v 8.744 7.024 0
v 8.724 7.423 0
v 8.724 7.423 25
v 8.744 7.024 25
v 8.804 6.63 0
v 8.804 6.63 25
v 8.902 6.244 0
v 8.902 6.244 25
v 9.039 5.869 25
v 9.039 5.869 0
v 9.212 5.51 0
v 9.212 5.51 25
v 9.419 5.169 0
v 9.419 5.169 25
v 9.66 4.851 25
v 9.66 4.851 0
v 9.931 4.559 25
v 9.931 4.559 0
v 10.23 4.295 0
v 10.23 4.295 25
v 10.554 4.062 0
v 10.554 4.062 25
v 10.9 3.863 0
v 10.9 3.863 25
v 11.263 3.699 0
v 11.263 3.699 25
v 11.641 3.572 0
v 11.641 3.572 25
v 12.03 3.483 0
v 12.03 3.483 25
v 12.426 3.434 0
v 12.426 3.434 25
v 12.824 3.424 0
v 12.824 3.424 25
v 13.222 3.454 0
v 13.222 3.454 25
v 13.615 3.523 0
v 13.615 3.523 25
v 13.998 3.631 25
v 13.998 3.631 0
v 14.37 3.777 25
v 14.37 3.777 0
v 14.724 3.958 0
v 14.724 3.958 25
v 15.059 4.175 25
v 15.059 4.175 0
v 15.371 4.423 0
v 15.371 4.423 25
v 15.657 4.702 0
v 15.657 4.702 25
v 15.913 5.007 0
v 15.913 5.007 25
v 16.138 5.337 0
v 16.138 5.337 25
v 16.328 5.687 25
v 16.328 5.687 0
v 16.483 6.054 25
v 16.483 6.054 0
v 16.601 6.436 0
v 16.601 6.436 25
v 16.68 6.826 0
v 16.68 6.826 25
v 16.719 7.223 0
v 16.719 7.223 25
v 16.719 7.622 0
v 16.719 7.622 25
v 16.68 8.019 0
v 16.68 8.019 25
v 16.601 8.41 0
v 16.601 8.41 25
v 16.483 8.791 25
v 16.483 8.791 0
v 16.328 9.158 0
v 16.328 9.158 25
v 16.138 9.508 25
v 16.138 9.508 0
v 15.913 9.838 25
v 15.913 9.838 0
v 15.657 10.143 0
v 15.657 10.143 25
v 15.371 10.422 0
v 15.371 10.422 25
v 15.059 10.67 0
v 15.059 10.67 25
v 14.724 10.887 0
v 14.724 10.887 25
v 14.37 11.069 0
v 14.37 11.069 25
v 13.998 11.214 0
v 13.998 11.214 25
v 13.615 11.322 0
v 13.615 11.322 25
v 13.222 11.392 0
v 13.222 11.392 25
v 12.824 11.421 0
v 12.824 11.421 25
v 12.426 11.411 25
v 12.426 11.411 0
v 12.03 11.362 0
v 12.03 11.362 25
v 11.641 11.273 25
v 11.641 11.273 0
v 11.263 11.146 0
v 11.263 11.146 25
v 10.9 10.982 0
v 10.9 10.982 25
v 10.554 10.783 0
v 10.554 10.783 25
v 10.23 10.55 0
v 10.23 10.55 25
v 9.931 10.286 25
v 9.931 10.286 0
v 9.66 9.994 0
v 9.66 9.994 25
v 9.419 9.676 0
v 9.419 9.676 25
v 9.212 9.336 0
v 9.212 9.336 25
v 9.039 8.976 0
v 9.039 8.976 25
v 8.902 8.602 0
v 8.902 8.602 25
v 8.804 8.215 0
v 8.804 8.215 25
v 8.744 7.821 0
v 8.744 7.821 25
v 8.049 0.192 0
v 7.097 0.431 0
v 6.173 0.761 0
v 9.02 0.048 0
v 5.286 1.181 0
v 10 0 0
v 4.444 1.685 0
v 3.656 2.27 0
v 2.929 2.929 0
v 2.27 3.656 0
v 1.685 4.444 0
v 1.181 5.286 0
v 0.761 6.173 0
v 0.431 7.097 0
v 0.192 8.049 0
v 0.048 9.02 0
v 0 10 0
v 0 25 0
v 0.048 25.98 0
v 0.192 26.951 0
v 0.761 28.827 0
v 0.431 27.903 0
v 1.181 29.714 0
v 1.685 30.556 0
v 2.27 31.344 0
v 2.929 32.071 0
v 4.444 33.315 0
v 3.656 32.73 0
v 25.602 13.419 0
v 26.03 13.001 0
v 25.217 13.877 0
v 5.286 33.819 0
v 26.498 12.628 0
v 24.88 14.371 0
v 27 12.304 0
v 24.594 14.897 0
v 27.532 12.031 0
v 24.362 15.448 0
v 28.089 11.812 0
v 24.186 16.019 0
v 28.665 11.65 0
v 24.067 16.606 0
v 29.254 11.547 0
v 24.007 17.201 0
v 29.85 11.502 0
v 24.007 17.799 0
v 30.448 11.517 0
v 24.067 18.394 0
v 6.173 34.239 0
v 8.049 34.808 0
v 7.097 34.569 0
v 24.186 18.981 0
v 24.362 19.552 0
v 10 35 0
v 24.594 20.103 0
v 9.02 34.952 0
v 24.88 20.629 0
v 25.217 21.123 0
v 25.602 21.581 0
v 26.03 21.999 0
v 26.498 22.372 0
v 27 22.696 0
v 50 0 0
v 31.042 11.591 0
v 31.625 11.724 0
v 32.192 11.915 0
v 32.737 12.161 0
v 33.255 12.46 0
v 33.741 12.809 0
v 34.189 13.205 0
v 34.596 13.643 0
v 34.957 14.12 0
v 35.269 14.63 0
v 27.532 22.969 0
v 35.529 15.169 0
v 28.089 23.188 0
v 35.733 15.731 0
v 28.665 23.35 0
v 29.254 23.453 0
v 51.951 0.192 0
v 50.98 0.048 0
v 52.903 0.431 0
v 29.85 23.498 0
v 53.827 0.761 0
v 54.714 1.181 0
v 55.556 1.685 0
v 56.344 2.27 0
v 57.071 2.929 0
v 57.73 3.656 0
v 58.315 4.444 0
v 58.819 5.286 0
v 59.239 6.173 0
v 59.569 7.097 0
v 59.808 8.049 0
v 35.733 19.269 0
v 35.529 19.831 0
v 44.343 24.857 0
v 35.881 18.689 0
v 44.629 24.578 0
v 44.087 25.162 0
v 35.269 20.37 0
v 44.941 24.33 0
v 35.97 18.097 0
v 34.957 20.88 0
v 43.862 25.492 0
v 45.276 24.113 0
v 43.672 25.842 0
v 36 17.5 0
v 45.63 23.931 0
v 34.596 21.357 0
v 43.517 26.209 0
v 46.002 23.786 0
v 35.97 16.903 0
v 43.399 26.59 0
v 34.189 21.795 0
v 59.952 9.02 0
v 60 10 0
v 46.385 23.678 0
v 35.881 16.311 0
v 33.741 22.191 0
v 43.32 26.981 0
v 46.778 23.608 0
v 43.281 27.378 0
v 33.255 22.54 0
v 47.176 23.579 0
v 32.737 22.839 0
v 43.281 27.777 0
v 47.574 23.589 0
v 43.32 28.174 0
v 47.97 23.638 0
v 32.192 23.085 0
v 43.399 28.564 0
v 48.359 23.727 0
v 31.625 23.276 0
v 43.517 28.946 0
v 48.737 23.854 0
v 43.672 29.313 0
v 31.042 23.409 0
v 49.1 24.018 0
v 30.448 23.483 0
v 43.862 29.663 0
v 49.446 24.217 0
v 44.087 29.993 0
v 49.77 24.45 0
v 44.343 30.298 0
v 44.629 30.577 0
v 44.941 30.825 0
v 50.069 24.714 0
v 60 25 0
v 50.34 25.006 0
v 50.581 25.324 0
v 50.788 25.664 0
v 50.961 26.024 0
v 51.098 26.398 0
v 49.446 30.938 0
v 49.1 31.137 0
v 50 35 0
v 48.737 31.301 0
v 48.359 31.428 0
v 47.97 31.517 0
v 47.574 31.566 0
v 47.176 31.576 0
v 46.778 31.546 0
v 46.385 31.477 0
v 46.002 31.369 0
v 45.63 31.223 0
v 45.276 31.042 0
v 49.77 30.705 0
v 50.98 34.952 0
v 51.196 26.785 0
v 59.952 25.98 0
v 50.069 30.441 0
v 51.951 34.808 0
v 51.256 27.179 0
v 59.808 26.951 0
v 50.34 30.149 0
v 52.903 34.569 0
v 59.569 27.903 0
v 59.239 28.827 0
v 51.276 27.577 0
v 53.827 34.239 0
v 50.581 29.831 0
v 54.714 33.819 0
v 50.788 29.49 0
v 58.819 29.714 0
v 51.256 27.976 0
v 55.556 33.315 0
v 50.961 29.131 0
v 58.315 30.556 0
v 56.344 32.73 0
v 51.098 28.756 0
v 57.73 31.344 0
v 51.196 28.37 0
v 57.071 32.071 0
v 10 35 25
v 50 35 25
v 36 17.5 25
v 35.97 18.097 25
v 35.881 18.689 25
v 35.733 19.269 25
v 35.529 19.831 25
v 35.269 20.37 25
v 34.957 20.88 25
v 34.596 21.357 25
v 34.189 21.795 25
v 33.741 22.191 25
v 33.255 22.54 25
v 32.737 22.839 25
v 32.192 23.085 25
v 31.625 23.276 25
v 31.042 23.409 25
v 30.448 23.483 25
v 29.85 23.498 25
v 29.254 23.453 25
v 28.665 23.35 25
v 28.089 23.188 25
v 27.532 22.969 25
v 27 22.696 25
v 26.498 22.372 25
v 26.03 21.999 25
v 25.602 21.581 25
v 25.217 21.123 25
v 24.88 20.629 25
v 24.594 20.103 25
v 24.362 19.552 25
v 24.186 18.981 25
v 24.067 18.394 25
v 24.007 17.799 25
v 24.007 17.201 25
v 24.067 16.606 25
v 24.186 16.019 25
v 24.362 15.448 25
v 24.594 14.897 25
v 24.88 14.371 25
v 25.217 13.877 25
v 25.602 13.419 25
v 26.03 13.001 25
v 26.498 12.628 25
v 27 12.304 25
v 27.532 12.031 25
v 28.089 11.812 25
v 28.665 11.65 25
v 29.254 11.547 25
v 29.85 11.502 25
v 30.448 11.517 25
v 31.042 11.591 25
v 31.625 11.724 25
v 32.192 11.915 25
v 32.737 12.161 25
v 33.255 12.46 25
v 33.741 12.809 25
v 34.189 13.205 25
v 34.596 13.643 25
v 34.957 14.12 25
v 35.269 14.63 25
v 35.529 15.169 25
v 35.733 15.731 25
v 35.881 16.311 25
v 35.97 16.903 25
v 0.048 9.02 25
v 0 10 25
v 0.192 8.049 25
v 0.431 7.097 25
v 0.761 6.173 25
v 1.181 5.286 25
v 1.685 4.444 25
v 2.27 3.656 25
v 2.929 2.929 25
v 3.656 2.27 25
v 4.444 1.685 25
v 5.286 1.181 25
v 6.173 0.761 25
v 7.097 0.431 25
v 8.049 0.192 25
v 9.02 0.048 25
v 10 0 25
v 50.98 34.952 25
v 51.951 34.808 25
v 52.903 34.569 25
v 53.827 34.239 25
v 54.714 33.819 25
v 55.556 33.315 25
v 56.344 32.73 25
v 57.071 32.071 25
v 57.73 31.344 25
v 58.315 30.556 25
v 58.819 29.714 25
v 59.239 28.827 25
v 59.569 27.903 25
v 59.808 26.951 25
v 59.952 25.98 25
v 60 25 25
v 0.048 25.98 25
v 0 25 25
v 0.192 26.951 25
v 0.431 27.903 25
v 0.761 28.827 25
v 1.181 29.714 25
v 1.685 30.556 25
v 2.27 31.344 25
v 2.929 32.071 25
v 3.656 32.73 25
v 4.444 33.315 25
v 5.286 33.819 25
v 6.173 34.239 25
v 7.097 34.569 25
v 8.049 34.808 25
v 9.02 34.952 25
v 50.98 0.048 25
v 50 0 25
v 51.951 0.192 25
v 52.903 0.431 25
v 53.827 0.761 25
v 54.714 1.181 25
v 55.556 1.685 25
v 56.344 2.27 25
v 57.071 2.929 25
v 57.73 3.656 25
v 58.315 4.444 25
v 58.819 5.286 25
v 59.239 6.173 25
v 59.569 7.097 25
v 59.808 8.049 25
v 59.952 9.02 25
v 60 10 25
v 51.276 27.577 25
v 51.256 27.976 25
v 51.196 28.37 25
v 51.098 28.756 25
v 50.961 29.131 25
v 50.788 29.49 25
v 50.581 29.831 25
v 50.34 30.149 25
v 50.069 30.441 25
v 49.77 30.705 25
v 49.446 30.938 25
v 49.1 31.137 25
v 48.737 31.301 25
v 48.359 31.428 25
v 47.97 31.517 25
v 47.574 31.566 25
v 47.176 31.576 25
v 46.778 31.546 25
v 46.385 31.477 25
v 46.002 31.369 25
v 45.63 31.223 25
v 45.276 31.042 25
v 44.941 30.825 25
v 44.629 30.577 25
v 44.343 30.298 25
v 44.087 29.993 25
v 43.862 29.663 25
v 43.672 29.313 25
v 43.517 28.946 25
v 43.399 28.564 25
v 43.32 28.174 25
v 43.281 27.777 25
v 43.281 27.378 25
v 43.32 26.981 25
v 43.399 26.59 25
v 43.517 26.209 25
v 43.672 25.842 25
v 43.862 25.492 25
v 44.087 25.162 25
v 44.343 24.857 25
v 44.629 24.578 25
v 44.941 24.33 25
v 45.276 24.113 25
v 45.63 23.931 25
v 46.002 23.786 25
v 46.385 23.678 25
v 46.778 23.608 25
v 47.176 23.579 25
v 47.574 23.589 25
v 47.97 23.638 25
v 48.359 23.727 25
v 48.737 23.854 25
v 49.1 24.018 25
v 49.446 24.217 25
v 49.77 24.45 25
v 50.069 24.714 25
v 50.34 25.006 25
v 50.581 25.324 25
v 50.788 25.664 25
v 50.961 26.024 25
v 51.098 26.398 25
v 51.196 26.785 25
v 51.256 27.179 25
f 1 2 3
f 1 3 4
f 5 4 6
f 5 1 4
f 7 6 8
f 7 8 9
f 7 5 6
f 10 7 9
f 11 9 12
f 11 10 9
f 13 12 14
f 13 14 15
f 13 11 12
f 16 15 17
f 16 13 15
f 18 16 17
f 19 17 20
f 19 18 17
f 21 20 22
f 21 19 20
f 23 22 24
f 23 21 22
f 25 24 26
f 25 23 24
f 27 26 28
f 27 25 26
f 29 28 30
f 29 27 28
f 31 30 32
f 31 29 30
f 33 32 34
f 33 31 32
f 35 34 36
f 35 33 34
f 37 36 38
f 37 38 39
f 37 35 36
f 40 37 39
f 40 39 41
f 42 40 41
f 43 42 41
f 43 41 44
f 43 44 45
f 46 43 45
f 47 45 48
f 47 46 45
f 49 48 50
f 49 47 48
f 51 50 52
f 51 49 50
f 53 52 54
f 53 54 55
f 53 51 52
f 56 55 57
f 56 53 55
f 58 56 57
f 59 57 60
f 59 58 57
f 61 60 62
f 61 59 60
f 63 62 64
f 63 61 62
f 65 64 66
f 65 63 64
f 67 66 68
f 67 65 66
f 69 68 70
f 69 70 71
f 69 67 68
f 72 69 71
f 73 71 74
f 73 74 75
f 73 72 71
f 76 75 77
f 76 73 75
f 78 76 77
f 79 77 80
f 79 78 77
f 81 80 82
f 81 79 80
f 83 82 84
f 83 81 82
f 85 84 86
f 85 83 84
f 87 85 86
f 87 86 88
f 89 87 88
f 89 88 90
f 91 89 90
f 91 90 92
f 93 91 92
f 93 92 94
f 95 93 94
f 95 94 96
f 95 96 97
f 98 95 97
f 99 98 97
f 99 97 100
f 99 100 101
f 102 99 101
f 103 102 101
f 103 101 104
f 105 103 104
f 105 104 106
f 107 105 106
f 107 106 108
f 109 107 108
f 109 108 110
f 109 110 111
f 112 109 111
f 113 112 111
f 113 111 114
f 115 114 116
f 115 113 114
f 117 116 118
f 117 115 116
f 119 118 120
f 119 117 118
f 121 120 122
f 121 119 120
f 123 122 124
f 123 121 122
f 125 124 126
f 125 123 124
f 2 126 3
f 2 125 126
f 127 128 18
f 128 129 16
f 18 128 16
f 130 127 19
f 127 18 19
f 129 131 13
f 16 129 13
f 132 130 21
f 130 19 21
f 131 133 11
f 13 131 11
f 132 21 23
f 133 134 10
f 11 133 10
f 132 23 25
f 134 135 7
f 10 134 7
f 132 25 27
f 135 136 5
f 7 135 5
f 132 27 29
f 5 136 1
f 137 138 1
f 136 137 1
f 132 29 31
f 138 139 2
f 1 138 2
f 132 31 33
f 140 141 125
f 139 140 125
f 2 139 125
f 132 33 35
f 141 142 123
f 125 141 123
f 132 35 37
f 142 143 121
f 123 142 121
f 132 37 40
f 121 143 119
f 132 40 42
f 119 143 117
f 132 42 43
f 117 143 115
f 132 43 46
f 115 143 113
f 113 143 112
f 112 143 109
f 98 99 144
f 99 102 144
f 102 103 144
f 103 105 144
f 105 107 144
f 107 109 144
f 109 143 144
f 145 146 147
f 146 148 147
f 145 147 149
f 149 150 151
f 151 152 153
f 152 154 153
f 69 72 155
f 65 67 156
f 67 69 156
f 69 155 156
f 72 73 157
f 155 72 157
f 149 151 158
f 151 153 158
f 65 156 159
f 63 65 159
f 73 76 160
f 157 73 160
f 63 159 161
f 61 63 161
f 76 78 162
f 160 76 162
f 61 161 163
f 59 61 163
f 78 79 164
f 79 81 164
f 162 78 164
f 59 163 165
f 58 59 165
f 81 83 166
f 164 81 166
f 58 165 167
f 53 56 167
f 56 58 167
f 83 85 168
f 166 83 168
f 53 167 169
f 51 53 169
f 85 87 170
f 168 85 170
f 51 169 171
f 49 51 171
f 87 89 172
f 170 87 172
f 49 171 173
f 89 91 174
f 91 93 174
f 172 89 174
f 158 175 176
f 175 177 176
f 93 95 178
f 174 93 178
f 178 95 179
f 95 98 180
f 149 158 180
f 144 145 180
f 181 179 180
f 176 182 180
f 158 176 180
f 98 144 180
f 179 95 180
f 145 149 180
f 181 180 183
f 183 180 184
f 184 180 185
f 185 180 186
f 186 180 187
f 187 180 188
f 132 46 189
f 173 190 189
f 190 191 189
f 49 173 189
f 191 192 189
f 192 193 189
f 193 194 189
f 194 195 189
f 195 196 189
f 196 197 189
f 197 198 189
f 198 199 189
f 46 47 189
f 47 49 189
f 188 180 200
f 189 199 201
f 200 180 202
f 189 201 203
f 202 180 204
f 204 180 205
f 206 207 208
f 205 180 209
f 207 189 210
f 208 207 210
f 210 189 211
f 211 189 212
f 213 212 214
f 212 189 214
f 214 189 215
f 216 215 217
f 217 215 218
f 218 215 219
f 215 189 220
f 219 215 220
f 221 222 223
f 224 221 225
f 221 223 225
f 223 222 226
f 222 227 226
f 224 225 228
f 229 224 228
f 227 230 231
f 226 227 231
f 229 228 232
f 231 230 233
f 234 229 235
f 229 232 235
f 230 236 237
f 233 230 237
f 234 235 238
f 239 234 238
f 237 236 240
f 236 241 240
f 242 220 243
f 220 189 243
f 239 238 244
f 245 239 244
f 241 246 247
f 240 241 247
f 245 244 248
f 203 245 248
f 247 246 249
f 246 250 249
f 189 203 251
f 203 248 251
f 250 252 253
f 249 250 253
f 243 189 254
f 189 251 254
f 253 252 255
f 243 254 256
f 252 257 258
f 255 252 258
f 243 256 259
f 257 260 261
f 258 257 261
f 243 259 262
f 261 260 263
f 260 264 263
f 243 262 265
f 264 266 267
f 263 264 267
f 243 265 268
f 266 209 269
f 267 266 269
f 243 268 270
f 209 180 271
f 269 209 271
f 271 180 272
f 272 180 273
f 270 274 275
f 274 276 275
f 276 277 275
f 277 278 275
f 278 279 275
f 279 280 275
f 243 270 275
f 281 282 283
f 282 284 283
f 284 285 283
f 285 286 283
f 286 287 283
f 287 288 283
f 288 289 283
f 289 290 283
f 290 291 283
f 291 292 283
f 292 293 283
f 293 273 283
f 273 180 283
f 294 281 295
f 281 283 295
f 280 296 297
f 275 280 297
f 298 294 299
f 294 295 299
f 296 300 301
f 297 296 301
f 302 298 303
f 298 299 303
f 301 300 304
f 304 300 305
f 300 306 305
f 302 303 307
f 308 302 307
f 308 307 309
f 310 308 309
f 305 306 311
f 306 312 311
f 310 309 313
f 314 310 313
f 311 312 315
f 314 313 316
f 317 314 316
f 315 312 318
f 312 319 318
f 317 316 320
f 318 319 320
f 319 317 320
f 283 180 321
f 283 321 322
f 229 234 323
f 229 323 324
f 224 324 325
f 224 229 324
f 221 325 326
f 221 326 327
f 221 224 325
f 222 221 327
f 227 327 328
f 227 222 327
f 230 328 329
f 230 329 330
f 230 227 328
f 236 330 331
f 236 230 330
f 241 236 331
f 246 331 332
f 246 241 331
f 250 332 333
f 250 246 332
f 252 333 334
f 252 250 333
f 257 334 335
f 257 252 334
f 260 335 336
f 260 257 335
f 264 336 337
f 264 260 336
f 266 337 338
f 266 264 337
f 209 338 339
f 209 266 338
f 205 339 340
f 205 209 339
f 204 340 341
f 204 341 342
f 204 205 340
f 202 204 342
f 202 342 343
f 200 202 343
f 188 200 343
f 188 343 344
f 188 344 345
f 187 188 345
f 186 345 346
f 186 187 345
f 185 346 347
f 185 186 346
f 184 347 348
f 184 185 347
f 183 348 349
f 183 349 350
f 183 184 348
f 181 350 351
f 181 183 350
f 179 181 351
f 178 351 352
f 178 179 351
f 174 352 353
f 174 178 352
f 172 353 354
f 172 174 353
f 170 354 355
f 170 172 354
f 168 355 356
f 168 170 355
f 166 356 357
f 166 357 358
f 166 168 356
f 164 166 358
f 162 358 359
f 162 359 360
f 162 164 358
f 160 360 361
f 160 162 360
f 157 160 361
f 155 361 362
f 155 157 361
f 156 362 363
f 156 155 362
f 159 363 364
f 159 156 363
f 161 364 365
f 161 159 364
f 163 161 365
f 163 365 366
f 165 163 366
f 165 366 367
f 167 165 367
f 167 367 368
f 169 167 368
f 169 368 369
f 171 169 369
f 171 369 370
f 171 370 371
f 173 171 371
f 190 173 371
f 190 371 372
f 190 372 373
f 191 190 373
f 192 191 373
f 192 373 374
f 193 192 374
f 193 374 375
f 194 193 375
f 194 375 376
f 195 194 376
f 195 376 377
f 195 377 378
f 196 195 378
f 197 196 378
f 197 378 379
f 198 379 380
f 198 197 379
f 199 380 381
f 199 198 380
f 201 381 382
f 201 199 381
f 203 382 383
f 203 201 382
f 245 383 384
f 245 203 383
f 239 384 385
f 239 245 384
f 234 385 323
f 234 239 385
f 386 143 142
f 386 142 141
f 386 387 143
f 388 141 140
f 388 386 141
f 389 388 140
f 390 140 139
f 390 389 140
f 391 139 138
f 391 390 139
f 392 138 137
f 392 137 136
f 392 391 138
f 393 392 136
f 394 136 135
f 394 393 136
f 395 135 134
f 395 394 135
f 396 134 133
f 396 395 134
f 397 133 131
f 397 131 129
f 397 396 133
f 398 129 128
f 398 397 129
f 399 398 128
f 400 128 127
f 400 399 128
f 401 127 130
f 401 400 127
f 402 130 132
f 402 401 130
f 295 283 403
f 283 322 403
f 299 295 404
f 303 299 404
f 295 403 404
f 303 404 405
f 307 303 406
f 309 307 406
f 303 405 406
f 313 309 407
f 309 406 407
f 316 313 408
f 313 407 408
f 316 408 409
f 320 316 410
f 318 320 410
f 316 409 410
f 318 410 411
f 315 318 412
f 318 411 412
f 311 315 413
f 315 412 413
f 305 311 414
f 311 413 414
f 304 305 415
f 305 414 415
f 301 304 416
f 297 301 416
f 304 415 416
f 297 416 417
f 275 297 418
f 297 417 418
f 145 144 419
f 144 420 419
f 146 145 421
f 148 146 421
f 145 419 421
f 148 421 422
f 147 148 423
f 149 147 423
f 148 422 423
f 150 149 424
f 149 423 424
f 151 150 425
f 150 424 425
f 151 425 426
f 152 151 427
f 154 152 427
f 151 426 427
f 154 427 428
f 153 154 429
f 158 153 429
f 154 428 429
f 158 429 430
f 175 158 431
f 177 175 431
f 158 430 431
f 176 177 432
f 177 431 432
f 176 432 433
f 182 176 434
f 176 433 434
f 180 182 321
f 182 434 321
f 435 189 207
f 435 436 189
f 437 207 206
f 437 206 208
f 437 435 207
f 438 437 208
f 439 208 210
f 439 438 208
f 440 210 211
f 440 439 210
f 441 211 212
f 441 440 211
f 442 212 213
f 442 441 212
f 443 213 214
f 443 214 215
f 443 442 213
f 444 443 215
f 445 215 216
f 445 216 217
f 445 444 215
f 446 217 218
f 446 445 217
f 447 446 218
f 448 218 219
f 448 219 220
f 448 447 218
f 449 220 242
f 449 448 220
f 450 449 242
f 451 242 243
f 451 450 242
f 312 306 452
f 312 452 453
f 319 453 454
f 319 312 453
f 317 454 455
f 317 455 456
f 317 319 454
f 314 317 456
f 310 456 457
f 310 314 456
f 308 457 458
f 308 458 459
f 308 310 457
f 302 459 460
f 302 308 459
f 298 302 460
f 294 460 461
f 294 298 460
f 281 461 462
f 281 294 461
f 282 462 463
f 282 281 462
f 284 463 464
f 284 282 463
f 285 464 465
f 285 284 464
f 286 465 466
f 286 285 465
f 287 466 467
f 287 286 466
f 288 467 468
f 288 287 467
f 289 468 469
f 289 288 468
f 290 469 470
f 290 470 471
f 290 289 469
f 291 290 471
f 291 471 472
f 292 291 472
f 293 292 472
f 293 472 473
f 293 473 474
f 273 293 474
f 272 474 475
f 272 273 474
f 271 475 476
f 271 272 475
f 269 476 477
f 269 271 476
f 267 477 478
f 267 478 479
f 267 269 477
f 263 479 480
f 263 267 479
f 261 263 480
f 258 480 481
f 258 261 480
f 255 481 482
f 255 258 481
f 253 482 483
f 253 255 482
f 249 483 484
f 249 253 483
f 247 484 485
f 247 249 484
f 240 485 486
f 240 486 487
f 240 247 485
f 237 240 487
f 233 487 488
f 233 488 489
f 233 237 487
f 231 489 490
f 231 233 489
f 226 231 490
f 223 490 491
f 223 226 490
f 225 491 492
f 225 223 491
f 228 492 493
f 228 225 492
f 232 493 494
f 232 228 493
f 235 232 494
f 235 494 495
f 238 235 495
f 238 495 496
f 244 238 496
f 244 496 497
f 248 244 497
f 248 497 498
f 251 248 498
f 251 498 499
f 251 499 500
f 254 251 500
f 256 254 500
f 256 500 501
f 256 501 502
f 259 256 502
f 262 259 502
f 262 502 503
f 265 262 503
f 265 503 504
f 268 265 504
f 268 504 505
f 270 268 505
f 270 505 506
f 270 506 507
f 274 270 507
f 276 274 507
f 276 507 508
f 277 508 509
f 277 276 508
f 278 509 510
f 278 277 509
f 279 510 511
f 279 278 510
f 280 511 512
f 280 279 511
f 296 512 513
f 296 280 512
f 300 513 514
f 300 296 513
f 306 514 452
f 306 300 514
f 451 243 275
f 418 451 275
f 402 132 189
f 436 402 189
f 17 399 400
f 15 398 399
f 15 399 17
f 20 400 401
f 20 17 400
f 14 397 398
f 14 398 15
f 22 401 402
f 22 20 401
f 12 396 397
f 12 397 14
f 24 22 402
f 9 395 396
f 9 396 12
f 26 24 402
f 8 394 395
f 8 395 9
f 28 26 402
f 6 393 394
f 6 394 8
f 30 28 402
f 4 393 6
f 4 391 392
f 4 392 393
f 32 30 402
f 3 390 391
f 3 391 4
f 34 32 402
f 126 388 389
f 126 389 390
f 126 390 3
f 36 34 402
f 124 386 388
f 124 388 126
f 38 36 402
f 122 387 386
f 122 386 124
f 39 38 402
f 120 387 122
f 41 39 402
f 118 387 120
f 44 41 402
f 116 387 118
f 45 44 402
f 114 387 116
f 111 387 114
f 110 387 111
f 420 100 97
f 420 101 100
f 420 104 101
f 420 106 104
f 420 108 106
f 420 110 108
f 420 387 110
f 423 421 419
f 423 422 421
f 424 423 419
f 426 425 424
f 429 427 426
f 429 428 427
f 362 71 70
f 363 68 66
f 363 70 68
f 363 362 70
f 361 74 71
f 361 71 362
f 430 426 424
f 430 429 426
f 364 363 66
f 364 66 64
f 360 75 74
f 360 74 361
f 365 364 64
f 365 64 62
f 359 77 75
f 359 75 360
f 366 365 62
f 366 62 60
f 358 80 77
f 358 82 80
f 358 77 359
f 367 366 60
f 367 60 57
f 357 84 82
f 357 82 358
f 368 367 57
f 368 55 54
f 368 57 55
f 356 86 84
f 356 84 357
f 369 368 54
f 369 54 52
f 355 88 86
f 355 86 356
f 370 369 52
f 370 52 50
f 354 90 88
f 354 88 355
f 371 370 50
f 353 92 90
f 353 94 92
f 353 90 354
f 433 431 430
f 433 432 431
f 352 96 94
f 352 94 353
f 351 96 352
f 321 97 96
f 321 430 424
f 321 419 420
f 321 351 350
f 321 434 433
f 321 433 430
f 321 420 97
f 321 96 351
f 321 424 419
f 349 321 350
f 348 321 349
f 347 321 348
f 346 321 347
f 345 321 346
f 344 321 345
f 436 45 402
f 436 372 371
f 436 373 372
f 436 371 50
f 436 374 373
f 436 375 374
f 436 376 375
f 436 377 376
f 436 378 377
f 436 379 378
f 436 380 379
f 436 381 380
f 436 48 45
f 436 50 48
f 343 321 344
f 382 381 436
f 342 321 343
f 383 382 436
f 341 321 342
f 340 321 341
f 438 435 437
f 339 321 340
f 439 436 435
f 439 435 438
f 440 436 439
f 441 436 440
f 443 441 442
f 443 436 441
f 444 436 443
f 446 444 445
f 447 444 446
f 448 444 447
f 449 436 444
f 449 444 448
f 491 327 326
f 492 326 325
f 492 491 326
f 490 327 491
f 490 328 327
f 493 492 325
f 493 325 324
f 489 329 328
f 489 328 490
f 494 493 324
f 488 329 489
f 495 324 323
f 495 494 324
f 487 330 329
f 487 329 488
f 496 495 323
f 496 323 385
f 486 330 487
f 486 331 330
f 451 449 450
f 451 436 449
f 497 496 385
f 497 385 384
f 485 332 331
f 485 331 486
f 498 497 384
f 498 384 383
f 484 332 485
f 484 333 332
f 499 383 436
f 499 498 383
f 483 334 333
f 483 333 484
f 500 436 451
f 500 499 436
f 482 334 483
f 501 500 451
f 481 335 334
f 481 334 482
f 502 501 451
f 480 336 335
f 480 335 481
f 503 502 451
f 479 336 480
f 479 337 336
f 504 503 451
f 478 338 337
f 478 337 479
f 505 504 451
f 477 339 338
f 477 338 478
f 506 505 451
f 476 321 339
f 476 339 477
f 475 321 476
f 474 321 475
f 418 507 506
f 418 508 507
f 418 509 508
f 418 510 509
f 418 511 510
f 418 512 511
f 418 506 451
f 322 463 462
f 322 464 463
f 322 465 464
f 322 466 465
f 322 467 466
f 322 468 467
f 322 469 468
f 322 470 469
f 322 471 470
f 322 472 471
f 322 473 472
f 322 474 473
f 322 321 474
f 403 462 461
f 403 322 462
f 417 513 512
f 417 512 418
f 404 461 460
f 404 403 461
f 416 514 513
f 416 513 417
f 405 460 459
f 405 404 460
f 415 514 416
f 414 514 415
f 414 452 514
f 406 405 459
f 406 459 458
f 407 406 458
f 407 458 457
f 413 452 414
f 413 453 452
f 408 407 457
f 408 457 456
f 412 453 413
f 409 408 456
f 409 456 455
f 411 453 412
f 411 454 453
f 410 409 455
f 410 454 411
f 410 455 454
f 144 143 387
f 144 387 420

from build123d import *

# Parameters (mm, degrees)
ESQUISSE1_W        = 60
ESQUISSE1_H        = 35
ESQUISSE1_R        = 6
ESQUISSE1_R_2      = 4
BOSS_EXTRU_1_DEPTH = 25
CONG_1_R           = 10


with BuildPart() as part:
    # Esquisse1 → Boss.-Extru.1 (new body)
    with BuildSketch(Plane.XY):
        with Locations((30, 17.5)):
            Rectangle(ESQUISSE1_W, ESQUISSE1_H)
        with Locations((30, 17.5)):
            Circle(ESQUISSE1_R, mode=Mode.SUBTRACT)
        with Locations((47.275578018, 27.57742051)):
            Circle(ESQUISSE1_R_2, mode=Mode.SUBTRACT)
        with Locations(Location((12.724421982, 7.42257949, 0), (0, 0, 180))):
            Circle(ESQUISSE1_R_2, mode=Mode.SUBTRACT)
    extrude(amount=BOSS_EXTRU_1_DEPTH)

    # Congé1
    cong_1_edges = [part.edges().sort_by_distance(p)[0] for p in [
        (0, 35, 12.5),
        (60, 35, 12.5),
        (60, 0, 12.5),
        (0, 0, 12.5),
    ]]
    fillet(cong_1_edges, radius=CONG_1_R)


solid = part.part
